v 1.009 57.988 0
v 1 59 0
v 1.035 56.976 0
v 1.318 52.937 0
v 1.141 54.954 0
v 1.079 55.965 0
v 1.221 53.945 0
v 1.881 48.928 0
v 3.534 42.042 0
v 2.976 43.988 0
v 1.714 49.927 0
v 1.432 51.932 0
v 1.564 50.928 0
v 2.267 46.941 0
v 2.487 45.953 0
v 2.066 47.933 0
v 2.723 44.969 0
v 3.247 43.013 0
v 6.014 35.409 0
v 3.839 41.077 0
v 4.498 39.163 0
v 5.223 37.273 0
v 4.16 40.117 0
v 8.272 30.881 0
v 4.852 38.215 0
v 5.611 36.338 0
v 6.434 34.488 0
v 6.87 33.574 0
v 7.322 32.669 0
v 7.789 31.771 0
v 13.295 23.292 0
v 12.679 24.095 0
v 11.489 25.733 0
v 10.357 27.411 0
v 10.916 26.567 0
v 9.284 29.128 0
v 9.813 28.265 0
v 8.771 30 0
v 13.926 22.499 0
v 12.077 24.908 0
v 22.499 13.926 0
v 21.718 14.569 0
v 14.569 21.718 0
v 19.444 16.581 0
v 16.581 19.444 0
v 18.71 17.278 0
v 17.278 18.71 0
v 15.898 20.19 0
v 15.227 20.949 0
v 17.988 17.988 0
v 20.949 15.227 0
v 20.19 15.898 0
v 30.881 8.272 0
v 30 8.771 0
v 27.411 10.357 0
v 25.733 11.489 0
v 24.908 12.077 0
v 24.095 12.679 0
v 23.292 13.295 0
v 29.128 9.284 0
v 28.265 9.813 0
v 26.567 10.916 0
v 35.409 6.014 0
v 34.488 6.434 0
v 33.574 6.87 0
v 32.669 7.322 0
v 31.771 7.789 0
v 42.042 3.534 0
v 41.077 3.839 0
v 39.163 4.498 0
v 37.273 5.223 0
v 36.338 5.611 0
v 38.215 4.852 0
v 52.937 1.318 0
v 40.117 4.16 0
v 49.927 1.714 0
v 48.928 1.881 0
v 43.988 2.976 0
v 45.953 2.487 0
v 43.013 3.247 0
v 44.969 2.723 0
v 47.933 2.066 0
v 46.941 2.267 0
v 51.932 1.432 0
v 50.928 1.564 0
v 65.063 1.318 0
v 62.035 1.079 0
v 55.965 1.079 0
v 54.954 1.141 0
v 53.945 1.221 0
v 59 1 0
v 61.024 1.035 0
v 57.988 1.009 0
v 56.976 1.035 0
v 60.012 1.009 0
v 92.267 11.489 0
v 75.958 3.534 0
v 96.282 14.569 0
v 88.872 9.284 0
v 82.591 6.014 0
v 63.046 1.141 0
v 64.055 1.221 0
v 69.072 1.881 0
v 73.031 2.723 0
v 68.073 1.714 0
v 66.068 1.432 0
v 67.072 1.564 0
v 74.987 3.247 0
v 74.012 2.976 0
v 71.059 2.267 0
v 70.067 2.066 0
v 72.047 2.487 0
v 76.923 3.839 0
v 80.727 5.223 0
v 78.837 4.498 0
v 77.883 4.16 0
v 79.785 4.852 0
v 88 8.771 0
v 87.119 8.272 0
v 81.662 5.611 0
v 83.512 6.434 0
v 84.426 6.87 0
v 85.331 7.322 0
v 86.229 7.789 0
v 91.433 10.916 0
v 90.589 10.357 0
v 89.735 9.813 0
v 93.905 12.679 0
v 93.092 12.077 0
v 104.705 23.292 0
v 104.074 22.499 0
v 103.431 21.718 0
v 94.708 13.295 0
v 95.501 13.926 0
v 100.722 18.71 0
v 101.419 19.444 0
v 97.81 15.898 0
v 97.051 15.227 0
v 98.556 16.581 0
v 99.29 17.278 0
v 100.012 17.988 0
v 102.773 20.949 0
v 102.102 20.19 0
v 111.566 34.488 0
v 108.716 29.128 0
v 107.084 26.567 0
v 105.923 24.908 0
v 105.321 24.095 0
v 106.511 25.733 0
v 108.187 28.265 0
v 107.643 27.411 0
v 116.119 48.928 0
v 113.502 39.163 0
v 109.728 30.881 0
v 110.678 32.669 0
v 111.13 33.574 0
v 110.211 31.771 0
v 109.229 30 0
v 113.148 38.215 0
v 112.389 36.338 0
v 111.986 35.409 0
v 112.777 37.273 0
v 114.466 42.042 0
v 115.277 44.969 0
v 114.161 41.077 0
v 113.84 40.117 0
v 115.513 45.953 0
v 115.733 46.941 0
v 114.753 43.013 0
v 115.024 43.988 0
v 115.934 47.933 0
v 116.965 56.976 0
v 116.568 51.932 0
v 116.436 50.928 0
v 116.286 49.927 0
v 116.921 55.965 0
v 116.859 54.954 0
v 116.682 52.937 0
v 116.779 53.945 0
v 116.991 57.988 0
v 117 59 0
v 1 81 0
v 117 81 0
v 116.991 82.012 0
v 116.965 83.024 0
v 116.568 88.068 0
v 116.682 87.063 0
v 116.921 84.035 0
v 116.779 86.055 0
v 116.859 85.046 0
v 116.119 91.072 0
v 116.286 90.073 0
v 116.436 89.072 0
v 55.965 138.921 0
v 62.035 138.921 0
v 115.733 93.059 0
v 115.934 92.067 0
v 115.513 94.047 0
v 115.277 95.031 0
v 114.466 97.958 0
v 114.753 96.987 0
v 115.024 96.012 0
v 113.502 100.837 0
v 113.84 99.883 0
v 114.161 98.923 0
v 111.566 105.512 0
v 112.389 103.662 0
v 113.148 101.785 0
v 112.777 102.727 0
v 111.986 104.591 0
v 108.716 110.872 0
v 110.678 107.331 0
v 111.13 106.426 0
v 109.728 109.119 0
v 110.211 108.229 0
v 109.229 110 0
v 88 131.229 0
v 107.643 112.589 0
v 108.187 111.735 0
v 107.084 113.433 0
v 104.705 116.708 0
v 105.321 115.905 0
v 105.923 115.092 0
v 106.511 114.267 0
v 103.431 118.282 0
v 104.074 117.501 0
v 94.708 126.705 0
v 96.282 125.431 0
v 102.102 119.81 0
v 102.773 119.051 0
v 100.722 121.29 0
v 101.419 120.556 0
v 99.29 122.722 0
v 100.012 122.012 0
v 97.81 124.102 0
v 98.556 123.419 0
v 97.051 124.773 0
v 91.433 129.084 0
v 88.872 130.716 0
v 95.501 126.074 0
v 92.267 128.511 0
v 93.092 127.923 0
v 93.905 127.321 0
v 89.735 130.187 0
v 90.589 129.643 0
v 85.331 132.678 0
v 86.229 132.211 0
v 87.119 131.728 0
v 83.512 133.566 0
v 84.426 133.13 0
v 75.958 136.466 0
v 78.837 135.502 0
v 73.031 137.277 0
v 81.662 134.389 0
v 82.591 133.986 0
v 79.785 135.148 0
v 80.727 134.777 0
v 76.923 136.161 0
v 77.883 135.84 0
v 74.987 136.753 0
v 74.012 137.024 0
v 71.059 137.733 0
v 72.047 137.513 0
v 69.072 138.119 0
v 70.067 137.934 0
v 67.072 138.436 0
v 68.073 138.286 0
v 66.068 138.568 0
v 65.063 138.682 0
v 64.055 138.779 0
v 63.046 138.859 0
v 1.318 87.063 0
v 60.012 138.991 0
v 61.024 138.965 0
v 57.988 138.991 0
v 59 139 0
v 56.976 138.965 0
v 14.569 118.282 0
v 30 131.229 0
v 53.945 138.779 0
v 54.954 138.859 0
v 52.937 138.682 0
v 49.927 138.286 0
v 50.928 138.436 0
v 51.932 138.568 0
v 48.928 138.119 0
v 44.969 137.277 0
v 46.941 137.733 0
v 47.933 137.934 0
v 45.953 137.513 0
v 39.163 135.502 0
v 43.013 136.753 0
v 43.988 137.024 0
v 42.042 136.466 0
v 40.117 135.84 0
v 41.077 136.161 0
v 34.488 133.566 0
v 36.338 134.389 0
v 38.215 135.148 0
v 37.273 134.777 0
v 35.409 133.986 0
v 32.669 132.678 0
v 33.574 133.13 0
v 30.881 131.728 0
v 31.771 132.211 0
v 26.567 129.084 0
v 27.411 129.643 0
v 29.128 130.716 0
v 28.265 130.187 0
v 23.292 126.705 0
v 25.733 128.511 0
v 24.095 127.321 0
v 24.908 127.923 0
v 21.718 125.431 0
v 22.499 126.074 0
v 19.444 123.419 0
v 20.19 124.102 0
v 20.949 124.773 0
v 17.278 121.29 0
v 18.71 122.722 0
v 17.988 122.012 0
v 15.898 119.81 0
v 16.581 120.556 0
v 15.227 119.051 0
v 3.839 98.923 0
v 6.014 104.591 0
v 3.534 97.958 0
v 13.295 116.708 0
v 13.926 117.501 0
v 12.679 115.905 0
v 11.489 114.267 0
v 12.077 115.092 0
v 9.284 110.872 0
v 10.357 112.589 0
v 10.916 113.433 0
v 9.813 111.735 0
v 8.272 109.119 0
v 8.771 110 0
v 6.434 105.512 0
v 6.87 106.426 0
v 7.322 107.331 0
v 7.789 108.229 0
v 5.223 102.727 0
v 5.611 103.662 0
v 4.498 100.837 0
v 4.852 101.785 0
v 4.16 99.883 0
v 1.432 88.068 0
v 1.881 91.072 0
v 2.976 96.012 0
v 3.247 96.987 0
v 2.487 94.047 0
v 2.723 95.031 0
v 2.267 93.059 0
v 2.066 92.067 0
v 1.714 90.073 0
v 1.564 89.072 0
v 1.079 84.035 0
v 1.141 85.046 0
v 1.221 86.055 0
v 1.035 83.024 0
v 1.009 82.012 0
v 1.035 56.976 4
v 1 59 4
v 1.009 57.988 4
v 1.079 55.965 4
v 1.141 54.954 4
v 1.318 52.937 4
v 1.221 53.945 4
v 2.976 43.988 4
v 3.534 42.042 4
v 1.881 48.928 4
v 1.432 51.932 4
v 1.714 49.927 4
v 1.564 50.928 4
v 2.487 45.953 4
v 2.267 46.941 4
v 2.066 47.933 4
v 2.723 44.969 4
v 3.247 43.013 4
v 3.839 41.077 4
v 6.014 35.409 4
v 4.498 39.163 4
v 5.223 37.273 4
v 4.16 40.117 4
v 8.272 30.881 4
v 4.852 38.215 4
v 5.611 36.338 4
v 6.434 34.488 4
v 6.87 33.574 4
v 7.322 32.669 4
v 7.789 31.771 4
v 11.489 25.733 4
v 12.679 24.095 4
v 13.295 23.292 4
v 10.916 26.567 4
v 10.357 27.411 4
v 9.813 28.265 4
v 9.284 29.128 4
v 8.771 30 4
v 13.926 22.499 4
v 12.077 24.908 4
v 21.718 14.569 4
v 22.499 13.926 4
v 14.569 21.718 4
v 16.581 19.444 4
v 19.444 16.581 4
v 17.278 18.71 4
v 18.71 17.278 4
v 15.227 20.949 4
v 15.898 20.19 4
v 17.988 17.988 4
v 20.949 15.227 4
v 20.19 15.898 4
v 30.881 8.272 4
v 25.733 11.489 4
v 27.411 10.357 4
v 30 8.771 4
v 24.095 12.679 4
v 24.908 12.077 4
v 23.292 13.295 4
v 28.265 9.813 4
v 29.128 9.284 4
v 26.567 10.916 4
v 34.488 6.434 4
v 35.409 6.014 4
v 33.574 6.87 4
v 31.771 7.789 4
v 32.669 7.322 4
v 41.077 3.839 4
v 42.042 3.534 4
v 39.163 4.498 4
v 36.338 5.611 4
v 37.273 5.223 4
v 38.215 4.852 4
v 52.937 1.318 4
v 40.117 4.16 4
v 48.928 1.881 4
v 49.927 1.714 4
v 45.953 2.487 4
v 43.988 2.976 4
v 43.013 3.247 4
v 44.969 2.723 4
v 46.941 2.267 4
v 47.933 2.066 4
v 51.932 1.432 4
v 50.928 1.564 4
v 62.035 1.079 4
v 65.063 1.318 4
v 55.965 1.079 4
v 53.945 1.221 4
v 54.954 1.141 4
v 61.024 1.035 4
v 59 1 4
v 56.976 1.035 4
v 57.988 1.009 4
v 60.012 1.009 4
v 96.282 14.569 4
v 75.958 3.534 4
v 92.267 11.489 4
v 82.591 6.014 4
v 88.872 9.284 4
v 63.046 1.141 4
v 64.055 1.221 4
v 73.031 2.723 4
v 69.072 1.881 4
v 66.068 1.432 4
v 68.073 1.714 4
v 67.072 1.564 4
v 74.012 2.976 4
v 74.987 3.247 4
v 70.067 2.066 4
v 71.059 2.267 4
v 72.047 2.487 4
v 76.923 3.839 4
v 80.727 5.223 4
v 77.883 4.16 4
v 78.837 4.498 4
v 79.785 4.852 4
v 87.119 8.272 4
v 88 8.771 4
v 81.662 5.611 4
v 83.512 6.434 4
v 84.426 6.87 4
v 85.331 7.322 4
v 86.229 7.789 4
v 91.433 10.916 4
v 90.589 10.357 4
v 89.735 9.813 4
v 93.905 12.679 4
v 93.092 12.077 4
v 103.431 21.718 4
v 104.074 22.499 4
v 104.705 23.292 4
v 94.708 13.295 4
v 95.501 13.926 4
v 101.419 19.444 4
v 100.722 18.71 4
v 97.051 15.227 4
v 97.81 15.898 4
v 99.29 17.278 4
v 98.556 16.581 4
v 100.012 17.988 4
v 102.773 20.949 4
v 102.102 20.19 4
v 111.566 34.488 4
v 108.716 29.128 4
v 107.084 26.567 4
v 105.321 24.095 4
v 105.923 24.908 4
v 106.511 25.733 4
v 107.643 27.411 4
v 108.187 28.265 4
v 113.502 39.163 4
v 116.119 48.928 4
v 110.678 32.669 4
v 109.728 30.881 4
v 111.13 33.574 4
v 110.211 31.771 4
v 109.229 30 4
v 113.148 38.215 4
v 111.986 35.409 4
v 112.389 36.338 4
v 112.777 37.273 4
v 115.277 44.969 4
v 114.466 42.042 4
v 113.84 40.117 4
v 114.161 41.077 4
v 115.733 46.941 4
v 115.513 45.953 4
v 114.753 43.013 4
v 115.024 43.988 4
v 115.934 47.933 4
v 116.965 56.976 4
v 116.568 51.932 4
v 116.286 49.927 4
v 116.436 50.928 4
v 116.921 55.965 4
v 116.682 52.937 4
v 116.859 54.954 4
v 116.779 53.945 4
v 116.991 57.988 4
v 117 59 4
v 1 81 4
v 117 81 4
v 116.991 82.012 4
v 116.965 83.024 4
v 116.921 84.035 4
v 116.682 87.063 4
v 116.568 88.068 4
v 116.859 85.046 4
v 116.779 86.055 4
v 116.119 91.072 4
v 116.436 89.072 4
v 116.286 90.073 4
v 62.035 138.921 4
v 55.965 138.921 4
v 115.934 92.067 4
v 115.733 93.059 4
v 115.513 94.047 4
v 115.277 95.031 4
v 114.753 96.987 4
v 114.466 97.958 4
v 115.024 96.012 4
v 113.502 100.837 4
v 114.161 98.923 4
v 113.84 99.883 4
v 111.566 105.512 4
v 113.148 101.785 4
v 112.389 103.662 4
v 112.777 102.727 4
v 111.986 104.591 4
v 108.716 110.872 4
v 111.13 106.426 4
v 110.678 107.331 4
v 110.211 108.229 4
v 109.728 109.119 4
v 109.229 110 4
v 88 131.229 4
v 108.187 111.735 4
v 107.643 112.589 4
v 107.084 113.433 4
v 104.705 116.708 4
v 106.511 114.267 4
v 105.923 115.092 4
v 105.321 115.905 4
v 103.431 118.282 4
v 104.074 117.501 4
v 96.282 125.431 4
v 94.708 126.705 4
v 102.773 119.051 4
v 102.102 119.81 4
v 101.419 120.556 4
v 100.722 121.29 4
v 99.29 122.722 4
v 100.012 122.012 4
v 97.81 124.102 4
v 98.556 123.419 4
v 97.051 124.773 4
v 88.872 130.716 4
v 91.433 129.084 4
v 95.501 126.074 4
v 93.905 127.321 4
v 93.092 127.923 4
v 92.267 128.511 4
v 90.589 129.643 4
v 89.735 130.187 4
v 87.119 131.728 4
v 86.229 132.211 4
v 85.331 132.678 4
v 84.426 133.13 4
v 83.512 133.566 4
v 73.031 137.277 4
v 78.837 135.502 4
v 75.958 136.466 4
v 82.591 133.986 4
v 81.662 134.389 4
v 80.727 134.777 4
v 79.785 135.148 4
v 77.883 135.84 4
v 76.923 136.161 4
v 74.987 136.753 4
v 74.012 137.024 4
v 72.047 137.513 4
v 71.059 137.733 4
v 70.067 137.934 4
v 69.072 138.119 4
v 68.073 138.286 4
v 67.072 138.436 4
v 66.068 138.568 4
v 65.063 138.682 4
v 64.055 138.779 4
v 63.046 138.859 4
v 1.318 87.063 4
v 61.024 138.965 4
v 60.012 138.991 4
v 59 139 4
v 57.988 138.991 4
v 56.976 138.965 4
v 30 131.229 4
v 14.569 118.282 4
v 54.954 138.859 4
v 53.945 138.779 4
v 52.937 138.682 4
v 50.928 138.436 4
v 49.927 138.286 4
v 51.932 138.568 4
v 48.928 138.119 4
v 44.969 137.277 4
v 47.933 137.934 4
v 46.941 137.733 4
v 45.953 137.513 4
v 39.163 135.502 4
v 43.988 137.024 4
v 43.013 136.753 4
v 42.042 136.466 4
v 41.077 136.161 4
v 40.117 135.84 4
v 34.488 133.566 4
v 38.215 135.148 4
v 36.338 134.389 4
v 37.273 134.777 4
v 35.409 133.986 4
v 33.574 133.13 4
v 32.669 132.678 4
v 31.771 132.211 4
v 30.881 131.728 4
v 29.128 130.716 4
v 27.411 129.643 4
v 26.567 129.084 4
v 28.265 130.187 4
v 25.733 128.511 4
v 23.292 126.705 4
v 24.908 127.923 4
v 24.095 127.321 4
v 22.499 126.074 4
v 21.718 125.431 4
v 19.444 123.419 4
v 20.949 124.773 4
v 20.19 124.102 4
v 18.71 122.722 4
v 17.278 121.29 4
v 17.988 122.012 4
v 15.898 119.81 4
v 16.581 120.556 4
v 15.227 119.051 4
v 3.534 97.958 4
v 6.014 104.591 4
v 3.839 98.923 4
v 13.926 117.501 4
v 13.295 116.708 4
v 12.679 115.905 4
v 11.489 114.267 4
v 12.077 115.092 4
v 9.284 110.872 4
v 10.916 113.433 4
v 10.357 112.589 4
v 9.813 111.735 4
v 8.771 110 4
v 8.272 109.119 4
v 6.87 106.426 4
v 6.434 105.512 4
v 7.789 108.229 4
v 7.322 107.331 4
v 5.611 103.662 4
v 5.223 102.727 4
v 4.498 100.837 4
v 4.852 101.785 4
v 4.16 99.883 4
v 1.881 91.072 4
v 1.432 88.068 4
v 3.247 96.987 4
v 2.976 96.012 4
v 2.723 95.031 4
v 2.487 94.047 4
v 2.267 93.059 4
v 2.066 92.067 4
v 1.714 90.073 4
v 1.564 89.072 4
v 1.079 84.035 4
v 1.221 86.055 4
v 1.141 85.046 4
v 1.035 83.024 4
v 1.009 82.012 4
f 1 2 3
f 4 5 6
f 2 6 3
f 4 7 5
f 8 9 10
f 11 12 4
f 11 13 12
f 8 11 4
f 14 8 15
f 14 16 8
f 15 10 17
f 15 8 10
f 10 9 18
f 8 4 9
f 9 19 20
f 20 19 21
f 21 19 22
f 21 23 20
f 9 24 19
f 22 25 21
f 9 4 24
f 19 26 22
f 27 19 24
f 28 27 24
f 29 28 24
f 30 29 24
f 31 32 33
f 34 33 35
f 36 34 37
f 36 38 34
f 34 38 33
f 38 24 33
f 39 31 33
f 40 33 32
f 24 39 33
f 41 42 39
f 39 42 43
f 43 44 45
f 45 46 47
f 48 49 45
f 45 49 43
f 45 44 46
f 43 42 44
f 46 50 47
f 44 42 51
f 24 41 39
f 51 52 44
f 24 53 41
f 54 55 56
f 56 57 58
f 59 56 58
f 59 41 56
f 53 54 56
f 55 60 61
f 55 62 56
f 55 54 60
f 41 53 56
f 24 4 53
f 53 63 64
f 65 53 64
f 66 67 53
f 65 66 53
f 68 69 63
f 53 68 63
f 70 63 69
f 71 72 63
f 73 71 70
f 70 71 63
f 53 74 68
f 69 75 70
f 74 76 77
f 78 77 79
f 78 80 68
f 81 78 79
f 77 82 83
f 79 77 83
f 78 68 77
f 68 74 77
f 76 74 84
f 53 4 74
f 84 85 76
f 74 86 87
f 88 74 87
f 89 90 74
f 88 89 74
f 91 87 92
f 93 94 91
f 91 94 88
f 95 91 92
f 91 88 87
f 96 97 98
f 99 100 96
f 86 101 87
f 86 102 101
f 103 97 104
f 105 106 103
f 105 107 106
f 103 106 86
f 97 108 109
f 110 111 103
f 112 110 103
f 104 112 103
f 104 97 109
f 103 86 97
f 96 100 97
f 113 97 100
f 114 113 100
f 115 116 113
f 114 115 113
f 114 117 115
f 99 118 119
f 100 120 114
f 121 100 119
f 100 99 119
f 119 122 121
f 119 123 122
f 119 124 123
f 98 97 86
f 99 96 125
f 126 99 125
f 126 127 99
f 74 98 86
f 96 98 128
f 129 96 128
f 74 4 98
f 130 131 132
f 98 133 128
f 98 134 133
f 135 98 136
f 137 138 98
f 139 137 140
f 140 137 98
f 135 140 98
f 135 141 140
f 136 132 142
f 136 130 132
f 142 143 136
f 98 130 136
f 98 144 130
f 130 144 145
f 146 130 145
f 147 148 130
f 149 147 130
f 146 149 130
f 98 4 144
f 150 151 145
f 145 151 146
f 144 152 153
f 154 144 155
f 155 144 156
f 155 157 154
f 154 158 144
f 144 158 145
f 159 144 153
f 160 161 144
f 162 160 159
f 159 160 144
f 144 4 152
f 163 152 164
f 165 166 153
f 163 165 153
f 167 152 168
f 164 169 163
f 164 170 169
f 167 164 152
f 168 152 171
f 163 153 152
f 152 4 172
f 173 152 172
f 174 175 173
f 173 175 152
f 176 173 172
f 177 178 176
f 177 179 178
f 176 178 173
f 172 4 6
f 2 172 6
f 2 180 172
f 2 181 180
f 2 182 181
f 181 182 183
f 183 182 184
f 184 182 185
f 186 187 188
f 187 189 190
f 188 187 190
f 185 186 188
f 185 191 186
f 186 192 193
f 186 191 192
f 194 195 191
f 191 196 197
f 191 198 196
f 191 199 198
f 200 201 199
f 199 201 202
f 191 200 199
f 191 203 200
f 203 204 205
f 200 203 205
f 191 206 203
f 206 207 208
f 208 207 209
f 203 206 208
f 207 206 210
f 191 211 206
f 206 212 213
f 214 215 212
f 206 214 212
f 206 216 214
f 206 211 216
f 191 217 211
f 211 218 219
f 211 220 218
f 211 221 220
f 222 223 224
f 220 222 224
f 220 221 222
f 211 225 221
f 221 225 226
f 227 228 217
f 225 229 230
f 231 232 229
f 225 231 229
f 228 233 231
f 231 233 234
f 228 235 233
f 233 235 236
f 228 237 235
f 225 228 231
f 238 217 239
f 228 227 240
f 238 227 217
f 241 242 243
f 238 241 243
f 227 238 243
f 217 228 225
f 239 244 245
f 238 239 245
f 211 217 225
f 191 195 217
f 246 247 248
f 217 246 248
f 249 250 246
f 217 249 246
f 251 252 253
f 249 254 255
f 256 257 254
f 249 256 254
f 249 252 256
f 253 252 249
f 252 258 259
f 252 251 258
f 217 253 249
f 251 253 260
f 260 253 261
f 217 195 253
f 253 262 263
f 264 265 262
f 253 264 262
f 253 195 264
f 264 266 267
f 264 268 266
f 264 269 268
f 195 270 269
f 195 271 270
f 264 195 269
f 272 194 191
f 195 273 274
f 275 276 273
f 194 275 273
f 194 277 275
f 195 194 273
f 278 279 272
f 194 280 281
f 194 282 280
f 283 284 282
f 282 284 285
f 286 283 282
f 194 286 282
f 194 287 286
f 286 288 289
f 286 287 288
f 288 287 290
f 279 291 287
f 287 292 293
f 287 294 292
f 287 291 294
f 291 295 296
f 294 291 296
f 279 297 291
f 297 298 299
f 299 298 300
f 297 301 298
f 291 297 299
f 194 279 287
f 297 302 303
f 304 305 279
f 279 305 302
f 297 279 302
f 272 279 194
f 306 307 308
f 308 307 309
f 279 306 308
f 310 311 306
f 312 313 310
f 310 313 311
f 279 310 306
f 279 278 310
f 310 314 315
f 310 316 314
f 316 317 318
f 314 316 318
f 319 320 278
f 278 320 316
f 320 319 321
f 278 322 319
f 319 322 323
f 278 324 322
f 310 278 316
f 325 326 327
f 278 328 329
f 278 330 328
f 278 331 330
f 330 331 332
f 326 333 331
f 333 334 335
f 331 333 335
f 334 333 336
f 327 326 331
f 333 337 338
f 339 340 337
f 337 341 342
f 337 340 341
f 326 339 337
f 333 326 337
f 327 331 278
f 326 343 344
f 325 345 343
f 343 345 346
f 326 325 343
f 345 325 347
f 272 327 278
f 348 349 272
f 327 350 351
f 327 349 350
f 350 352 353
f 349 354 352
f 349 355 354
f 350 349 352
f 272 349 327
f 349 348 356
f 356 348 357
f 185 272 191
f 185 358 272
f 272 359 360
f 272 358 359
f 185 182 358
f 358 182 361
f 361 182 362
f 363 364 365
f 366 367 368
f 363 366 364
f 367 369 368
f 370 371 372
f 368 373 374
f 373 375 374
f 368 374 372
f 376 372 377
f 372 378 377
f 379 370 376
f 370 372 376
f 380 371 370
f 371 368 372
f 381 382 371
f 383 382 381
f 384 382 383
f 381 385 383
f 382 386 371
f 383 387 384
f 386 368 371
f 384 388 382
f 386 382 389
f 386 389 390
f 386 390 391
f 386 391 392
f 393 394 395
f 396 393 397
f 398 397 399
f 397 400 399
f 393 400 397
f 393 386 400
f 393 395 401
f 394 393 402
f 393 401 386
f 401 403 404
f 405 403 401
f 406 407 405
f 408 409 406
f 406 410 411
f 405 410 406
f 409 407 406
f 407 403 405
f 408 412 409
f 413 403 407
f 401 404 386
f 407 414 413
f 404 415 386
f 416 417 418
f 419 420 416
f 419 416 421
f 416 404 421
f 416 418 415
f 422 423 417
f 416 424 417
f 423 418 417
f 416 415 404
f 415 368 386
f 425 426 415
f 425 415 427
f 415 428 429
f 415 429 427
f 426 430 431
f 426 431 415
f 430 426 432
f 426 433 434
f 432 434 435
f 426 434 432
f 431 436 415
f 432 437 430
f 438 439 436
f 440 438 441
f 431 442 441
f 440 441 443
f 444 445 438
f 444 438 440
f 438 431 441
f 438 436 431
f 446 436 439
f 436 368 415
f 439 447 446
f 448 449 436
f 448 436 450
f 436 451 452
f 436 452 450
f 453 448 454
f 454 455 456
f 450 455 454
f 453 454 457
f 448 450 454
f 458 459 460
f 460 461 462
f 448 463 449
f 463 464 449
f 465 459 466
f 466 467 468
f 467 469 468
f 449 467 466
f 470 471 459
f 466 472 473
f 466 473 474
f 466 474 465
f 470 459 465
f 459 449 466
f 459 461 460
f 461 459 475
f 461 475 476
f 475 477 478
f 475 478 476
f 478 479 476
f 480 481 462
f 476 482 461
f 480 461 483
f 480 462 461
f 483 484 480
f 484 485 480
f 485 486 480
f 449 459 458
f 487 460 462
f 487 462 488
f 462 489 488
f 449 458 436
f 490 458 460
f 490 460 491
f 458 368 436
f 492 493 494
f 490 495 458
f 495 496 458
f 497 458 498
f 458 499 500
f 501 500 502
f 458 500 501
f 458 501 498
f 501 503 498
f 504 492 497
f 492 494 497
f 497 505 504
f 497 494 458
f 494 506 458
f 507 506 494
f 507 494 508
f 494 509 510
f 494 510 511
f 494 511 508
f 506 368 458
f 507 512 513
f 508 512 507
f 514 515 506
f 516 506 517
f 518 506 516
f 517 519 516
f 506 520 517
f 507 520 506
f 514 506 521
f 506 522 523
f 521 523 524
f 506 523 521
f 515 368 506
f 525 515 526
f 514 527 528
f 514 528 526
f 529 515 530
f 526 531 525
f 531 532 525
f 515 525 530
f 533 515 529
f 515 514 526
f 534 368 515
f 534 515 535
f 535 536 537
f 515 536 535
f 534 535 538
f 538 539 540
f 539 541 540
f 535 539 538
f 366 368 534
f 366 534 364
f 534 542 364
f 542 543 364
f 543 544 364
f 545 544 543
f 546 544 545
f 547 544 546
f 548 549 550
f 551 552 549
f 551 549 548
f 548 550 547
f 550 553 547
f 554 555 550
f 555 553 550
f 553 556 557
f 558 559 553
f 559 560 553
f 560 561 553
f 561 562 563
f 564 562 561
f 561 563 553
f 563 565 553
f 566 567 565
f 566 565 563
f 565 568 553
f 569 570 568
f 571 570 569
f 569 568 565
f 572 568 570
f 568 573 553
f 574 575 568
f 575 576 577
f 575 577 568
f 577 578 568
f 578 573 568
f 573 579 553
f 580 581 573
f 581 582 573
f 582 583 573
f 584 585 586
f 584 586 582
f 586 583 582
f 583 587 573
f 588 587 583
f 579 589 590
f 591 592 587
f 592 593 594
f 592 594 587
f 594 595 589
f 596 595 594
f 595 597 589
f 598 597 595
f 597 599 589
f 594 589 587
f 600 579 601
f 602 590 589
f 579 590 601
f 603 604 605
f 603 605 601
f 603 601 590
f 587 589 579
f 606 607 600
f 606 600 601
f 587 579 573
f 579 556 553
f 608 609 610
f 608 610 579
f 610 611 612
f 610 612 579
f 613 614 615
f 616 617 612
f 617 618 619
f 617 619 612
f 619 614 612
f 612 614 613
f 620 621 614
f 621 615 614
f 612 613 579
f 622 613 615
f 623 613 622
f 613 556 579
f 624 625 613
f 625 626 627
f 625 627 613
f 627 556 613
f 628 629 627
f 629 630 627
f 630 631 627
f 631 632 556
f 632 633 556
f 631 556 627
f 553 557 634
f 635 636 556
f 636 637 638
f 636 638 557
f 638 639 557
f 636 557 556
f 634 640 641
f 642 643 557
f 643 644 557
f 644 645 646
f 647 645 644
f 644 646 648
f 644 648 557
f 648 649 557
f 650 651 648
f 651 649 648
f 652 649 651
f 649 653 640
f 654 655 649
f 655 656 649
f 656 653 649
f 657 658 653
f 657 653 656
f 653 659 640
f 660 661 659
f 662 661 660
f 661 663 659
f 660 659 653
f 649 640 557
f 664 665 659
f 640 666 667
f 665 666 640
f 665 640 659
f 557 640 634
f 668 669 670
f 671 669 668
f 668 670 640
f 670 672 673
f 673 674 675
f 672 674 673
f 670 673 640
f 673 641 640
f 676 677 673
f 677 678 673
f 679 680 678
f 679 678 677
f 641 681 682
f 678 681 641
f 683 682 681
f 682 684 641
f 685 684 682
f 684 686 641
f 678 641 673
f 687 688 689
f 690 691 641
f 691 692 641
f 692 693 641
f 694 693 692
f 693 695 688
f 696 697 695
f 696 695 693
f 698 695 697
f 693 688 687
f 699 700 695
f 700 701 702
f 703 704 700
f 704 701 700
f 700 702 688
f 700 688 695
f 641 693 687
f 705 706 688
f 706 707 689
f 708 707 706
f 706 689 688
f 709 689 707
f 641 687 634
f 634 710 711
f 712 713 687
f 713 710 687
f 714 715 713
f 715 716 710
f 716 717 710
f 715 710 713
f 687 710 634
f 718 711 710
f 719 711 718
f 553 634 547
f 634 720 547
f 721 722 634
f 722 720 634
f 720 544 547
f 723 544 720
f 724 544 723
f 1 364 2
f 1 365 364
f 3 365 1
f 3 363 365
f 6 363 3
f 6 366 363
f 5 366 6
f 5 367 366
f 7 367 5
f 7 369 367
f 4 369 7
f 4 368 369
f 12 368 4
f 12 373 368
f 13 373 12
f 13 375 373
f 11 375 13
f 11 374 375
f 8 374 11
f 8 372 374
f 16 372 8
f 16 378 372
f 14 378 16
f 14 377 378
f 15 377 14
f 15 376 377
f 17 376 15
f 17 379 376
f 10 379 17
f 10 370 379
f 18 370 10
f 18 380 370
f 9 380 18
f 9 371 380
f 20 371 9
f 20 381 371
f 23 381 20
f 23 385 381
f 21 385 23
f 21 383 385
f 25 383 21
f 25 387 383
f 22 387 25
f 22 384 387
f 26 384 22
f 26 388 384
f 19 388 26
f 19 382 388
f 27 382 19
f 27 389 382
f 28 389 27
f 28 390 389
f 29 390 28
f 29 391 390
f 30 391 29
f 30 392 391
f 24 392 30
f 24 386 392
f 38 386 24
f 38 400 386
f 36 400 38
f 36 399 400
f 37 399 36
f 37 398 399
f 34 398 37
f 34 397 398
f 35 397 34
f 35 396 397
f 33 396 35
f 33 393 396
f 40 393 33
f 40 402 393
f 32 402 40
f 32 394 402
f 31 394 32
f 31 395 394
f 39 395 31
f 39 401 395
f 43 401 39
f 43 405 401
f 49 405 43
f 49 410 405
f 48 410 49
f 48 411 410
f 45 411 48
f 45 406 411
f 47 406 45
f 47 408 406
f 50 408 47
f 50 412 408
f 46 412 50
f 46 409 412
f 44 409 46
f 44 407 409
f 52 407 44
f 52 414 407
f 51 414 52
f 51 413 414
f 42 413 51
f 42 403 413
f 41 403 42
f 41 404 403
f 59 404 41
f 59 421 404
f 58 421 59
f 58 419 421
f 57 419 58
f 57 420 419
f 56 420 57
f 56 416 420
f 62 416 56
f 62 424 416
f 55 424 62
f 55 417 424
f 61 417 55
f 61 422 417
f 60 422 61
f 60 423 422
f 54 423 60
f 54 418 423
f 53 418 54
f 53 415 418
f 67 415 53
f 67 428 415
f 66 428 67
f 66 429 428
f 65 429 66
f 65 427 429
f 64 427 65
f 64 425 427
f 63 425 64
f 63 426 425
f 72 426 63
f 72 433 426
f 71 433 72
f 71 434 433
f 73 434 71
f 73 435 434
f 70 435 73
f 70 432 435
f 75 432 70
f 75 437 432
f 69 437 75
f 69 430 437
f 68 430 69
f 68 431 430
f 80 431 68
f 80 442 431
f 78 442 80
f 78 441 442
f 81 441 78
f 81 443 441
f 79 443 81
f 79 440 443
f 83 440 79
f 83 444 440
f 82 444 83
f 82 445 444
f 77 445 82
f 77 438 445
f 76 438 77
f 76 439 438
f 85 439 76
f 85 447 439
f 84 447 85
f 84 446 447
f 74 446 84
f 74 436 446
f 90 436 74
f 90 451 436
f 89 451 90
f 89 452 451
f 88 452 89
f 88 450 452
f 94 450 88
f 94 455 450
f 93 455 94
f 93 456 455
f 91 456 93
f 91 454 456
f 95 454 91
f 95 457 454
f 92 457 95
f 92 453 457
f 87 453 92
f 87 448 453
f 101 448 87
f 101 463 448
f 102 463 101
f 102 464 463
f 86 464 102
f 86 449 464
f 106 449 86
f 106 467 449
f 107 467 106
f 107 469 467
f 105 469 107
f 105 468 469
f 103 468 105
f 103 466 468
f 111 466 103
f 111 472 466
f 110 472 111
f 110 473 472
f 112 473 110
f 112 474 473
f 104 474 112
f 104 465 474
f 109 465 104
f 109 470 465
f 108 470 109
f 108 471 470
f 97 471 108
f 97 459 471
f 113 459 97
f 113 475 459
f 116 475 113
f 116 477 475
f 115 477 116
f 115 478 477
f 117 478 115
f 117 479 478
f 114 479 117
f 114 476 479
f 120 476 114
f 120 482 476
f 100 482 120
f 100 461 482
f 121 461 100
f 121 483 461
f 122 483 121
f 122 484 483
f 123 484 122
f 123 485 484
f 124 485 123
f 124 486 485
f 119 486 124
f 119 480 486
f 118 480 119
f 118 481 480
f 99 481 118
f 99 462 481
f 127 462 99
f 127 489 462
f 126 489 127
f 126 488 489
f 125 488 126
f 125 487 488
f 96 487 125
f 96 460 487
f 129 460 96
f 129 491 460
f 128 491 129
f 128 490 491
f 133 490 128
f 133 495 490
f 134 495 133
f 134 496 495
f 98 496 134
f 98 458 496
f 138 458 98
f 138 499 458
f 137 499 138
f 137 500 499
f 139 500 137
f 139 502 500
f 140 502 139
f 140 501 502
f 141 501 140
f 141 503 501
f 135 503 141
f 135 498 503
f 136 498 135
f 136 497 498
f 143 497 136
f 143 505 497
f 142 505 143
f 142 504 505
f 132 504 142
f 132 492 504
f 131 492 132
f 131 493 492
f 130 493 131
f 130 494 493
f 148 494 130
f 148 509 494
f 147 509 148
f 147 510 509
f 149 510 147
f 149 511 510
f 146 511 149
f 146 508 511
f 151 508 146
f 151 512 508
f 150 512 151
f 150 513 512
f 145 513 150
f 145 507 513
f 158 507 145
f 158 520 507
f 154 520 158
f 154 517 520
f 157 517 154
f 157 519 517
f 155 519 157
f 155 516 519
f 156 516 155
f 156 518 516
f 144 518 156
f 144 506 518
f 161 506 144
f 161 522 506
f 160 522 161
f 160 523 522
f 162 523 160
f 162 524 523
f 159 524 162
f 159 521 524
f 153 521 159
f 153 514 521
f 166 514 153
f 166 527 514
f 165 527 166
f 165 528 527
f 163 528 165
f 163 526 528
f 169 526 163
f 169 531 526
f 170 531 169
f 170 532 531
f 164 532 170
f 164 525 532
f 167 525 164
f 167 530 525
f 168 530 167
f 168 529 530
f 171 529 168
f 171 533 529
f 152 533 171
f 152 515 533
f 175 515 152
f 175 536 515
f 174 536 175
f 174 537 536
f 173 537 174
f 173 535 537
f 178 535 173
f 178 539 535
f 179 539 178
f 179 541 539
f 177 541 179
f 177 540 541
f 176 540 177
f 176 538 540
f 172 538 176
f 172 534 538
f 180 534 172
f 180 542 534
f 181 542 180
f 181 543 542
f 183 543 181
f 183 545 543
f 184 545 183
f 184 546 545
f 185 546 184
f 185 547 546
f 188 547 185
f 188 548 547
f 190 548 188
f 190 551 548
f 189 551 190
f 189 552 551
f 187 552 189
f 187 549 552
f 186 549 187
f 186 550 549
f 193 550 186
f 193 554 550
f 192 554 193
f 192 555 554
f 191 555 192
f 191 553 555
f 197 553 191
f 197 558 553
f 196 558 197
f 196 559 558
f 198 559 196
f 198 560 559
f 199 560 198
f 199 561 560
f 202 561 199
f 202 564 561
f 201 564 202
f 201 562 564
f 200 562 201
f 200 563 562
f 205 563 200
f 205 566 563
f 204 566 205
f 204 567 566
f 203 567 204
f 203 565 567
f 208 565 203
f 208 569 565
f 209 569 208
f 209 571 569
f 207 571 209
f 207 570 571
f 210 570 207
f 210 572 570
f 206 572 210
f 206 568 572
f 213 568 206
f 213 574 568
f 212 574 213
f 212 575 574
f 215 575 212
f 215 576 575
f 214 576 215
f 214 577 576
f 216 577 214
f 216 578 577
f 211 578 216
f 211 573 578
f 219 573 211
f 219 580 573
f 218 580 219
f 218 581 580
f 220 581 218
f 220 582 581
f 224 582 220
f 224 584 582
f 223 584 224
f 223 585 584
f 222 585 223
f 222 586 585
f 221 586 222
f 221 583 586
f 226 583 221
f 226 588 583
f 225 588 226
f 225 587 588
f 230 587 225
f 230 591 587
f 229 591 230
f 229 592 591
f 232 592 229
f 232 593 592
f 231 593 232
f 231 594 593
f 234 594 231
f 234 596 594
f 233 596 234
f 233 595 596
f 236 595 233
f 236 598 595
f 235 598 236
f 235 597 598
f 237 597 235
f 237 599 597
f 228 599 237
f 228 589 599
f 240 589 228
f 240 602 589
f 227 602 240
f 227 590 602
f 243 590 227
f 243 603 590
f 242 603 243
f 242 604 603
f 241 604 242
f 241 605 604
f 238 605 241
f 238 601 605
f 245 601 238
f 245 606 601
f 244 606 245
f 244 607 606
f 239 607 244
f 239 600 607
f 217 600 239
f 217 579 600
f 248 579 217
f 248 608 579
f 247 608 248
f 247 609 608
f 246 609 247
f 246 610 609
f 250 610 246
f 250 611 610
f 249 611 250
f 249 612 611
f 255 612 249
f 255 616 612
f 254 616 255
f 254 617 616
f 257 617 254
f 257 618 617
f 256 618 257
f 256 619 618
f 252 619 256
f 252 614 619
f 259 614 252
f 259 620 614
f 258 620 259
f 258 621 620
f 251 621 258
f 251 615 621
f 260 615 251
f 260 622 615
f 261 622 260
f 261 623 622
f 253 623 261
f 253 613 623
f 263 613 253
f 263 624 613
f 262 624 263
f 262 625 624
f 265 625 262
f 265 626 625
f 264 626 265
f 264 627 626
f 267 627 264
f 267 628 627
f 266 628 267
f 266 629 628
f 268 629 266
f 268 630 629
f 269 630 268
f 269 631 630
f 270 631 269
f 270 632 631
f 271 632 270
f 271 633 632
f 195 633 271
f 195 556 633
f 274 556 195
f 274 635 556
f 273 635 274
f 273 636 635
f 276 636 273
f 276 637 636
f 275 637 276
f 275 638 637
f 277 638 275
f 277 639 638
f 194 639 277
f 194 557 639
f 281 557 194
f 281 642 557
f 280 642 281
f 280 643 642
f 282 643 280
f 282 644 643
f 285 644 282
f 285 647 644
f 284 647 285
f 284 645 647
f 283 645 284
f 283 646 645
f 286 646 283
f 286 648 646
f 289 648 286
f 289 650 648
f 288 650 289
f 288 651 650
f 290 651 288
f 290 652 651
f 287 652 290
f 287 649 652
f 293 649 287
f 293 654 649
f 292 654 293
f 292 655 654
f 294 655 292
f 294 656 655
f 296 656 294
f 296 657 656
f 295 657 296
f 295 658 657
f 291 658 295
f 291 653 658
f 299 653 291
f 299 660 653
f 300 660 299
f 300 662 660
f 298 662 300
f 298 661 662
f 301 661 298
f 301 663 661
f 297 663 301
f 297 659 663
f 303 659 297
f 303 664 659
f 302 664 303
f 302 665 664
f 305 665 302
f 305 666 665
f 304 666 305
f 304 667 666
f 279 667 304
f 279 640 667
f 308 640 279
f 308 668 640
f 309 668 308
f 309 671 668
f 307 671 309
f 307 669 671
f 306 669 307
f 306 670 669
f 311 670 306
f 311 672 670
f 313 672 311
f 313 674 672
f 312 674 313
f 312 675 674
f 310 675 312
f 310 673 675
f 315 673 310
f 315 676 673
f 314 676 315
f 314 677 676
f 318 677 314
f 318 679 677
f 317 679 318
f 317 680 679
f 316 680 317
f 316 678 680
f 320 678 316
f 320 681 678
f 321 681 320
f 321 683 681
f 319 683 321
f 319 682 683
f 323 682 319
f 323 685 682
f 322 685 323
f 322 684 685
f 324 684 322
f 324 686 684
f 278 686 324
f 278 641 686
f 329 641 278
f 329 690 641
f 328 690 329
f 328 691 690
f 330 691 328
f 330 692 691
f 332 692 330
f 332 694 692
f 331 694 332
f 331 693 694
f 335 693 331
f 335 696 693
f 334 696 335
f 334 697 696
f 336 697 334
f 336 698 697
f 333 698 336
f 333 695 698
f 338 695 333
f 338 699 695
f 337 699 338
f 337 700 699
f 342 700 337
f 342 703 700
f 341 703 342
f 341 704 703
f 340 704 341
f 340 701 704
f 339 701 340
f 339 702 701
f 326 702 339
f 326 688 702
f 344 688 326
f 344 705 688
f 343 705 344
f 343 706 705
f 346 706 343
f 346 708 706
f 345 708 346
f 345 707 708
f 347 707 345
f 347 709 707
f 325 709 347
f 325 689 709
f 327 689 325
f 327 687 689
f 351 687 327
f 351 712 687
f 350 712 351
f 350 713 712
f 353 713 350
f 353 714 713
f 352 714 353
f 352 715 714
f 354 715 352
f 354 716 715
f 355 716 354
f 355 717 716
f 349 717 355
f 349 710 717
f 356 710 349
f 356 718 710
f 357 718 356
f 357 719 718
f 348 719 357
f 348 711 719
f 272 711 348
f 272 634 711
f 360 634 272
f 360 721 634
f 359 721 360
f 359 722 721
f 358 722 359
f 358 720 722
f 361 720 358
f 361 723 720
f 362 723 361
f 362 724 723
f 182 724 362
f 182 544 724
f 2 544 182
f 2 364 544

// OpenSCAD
// file: 2.1.scad
/* Copyright 2018 Guillaume JORANDON
 * 
 * This file is distributed under the terms of the MIT License.
 * Check https://opensource.org/licenses/MIT for more details.
 * 
 * ./rear_core/2.1.scad: front backplate for the main structure of the rear core.
 *
 * quantity: 1
 * NB.: units are assumed to be millimeters.
 */

include <../globals.scad>
include <./globals.scad>

/* The base shape. Apply a reduction to make it smaller. */
module rear_core_base_shape(reduction=0) {
    hull() {
        circle((rear_core_width-reduction)/2);
        translate([0, rear_core_height-rear_core_width, 0]) circle((rear_core_width-reduction)/2);
    }
}

/* A hole for the reinforcement bar. Default values are for the two primary reinforcement holes. */
module rear_core_reinforcement_bar_hole(width=rear_core_reinforcing_bar_hole_width, position=[(rear_core_width-sheet_thickness)/2, (rear_core_height-rear_core_width)/2, 0]) {
    translate(position) square([sheet_thickness, width], true);
}

/* A backplate for the main structural shape of the rear core. */
module rear_core_2_1() {
    translate([rear_core_width/2, rear_core_width/2, 0]) 
    difference() {
        // External shape
        rear_core_base_shape();
        // Internal shape (there is an extra reduction for the casing margin)
        rear_core_base_shape(reduction=rear_core_back_reduction+2*rear_core_cover_casing_margin);
        // Right rear_core_reinforcement_bar_hole
        rear_core_reinforcement_bar_hole();
        // Left rear_core_reinforcement_bar_hole
        mirror([1, 0, 0]) rear_core_reinforcement_bar_hole();
        // Bottom reinforcement bar_hole
        translate([0, -(rear_core_width-rear_core_back_reduction/2)/2, 0]) 
        rotate([0, 0, 90]) rear_core_reinforcement_bar_hole(position=[0, 0, 0], width=rear_core_reinforcing_bar_hole_width-4);
    }
}

function rear_core_2_1_dims() = [rear_core_width, rear_core_height, 0];

linear_extrude(sheet_thickness) rear_core_2_1();
// file: globals.scad
/* Copyright 2018 Guillaume JORANDON
 * 
 * This file is distributed under the terms of the MIT License.
 * Check https://opensource.org/licenses/MIT for more details.
 * 
 * ./rear_core/globals.scad: global variables that apply to pieces from the rear core.
 *
 * NB.: units are assumed to be millimeters.
 */

include <../globals.scad>

/* Total height of the rear core */
rear_core_height = 140;
/* Total length of the rear core */
rear_core_length = 187;
/* Total width of the rear core */
rear_core_width = 118;
/* Amount of reduction on the back lip */
rear_core_back_reduction = 24;
/* Amount of reduction on the front lip */
rear_core_front_reduction = 6;
/* Length of both front and back lips */
rear_core_reduction_length = 12;

/* Distance between the intermediary backplates */
rear_core_intermediary_backplate_spacing = 40;

/* Width of a reinforcing bar */
rear_core_reinforcing_bar_width = 20;
/* Margin for the pin of the reinforcing bar */
rear_core_reinforcing_bar_margin = 4;
/* Deduced size of a hole for the pin of the reinforcing bar */
rear_core_reinforcing_bar_hole_width = rear_core_reinforcing_bar_width - 2*rear_core_reinforcing_bar_margin;

/* Lips are built by stacking multiple layers, and because it's a lip we need to reduce each layer so that we can then get a nice slope. */
rear_core_back_reduction_for_plates = ((sheet_thickness*rear_core_back_reduction)/(2*rear_core_reduction_length)) * 2;
rear_core_front_reduction_for_plates = ((sheet_thickness*rear_core_front_reduction)/(2*rear_core_reduction_length)) * 2;
/* Demo: Let's do some trigonometry. Take a right-angled triangle.
    |\
    | \ h
  r |  \
    |___\
      t
      
   We know t (sheet_thickness) and the angle between r (rear_core_back_reduction_for_plates) and the hypotenuse h, let's call this angle a.
   
   a = atan(2*rear_core_reduction_length/rear_core_back_reduction)
   
   We're looking for r.
   We know by definition that tan(a) = sheet_thickness/rear_core_back_reduction_for_plates
   => 2*rear_core_reduction_length/rear_core_back_reduction = sheet_thickness/rear_core_back_reduction_for_plates
   => rear_core_back_reduction_for_plates = (sheet_thickness*rear_core_back_reduction)/(2*rear_core_reduction_length)
   
   Then we multiply by two because the reduction occurs on each side.
   
   qed.
*/
/* How many plates do we need (may vary especially if you change the sheet_thickness. Ideally it *should* be at least 3, because we need one plate for the screws, and two more for the cover casing. */
rear_core_back_total_n_plates = ceil(rear_core_back_reduction/rear_core_back_reduction_for_plates);
/* Margin for the cover casing */
rear_core_cover_casing_margin = 4;
/* radius of the hole for the bolts of the cover */
rear_core_cover_screws_hole_radius = 2;
/* radius of the hole for the nuts of the cover */
rear_core_cover_nut_radius = 2*rear_core_cover_screws_hole_radius;
/* margin for the screw holes supports of the cover */
rear_core_cover_screws_hole_support_margin = 2;
/* radius of the hole for the rear shell attaching rod */
rear_core_rear_shell_attaching_rod_radius = 4;
// file: ../globals.scad
// units are assumed to be millimeters

// Thickness of laser cutted sheets
sheet_thickness = 4;
// Margin on printsheet
print_margin = 3;
// Curves accuracy
$fn = 360;
// main file
/* Copyright 2018 Guillaume JORANDON
 * 
 * This file is distributed under the terms of the MIT License.
 * Check https://opensource.org/licenses/MIT for more details.
 * 
 * ./rear_core/2.8.scad: front plate.
 * 
 * quantity: 1
 * NB.: units are assumed to be millimeters.
 */

include <../globals.scad>
include <./globals.scad>
use <./2.1.scad>

module rear_core_2_8() {
    translate([rear_core_width/2, rear_core_width/2, 0])
    rear_core_base_shape(reduction=rear_core_front_reduction_for_plates);
}

linear_extrude(sheet_thickness) rear_core_2_8();
